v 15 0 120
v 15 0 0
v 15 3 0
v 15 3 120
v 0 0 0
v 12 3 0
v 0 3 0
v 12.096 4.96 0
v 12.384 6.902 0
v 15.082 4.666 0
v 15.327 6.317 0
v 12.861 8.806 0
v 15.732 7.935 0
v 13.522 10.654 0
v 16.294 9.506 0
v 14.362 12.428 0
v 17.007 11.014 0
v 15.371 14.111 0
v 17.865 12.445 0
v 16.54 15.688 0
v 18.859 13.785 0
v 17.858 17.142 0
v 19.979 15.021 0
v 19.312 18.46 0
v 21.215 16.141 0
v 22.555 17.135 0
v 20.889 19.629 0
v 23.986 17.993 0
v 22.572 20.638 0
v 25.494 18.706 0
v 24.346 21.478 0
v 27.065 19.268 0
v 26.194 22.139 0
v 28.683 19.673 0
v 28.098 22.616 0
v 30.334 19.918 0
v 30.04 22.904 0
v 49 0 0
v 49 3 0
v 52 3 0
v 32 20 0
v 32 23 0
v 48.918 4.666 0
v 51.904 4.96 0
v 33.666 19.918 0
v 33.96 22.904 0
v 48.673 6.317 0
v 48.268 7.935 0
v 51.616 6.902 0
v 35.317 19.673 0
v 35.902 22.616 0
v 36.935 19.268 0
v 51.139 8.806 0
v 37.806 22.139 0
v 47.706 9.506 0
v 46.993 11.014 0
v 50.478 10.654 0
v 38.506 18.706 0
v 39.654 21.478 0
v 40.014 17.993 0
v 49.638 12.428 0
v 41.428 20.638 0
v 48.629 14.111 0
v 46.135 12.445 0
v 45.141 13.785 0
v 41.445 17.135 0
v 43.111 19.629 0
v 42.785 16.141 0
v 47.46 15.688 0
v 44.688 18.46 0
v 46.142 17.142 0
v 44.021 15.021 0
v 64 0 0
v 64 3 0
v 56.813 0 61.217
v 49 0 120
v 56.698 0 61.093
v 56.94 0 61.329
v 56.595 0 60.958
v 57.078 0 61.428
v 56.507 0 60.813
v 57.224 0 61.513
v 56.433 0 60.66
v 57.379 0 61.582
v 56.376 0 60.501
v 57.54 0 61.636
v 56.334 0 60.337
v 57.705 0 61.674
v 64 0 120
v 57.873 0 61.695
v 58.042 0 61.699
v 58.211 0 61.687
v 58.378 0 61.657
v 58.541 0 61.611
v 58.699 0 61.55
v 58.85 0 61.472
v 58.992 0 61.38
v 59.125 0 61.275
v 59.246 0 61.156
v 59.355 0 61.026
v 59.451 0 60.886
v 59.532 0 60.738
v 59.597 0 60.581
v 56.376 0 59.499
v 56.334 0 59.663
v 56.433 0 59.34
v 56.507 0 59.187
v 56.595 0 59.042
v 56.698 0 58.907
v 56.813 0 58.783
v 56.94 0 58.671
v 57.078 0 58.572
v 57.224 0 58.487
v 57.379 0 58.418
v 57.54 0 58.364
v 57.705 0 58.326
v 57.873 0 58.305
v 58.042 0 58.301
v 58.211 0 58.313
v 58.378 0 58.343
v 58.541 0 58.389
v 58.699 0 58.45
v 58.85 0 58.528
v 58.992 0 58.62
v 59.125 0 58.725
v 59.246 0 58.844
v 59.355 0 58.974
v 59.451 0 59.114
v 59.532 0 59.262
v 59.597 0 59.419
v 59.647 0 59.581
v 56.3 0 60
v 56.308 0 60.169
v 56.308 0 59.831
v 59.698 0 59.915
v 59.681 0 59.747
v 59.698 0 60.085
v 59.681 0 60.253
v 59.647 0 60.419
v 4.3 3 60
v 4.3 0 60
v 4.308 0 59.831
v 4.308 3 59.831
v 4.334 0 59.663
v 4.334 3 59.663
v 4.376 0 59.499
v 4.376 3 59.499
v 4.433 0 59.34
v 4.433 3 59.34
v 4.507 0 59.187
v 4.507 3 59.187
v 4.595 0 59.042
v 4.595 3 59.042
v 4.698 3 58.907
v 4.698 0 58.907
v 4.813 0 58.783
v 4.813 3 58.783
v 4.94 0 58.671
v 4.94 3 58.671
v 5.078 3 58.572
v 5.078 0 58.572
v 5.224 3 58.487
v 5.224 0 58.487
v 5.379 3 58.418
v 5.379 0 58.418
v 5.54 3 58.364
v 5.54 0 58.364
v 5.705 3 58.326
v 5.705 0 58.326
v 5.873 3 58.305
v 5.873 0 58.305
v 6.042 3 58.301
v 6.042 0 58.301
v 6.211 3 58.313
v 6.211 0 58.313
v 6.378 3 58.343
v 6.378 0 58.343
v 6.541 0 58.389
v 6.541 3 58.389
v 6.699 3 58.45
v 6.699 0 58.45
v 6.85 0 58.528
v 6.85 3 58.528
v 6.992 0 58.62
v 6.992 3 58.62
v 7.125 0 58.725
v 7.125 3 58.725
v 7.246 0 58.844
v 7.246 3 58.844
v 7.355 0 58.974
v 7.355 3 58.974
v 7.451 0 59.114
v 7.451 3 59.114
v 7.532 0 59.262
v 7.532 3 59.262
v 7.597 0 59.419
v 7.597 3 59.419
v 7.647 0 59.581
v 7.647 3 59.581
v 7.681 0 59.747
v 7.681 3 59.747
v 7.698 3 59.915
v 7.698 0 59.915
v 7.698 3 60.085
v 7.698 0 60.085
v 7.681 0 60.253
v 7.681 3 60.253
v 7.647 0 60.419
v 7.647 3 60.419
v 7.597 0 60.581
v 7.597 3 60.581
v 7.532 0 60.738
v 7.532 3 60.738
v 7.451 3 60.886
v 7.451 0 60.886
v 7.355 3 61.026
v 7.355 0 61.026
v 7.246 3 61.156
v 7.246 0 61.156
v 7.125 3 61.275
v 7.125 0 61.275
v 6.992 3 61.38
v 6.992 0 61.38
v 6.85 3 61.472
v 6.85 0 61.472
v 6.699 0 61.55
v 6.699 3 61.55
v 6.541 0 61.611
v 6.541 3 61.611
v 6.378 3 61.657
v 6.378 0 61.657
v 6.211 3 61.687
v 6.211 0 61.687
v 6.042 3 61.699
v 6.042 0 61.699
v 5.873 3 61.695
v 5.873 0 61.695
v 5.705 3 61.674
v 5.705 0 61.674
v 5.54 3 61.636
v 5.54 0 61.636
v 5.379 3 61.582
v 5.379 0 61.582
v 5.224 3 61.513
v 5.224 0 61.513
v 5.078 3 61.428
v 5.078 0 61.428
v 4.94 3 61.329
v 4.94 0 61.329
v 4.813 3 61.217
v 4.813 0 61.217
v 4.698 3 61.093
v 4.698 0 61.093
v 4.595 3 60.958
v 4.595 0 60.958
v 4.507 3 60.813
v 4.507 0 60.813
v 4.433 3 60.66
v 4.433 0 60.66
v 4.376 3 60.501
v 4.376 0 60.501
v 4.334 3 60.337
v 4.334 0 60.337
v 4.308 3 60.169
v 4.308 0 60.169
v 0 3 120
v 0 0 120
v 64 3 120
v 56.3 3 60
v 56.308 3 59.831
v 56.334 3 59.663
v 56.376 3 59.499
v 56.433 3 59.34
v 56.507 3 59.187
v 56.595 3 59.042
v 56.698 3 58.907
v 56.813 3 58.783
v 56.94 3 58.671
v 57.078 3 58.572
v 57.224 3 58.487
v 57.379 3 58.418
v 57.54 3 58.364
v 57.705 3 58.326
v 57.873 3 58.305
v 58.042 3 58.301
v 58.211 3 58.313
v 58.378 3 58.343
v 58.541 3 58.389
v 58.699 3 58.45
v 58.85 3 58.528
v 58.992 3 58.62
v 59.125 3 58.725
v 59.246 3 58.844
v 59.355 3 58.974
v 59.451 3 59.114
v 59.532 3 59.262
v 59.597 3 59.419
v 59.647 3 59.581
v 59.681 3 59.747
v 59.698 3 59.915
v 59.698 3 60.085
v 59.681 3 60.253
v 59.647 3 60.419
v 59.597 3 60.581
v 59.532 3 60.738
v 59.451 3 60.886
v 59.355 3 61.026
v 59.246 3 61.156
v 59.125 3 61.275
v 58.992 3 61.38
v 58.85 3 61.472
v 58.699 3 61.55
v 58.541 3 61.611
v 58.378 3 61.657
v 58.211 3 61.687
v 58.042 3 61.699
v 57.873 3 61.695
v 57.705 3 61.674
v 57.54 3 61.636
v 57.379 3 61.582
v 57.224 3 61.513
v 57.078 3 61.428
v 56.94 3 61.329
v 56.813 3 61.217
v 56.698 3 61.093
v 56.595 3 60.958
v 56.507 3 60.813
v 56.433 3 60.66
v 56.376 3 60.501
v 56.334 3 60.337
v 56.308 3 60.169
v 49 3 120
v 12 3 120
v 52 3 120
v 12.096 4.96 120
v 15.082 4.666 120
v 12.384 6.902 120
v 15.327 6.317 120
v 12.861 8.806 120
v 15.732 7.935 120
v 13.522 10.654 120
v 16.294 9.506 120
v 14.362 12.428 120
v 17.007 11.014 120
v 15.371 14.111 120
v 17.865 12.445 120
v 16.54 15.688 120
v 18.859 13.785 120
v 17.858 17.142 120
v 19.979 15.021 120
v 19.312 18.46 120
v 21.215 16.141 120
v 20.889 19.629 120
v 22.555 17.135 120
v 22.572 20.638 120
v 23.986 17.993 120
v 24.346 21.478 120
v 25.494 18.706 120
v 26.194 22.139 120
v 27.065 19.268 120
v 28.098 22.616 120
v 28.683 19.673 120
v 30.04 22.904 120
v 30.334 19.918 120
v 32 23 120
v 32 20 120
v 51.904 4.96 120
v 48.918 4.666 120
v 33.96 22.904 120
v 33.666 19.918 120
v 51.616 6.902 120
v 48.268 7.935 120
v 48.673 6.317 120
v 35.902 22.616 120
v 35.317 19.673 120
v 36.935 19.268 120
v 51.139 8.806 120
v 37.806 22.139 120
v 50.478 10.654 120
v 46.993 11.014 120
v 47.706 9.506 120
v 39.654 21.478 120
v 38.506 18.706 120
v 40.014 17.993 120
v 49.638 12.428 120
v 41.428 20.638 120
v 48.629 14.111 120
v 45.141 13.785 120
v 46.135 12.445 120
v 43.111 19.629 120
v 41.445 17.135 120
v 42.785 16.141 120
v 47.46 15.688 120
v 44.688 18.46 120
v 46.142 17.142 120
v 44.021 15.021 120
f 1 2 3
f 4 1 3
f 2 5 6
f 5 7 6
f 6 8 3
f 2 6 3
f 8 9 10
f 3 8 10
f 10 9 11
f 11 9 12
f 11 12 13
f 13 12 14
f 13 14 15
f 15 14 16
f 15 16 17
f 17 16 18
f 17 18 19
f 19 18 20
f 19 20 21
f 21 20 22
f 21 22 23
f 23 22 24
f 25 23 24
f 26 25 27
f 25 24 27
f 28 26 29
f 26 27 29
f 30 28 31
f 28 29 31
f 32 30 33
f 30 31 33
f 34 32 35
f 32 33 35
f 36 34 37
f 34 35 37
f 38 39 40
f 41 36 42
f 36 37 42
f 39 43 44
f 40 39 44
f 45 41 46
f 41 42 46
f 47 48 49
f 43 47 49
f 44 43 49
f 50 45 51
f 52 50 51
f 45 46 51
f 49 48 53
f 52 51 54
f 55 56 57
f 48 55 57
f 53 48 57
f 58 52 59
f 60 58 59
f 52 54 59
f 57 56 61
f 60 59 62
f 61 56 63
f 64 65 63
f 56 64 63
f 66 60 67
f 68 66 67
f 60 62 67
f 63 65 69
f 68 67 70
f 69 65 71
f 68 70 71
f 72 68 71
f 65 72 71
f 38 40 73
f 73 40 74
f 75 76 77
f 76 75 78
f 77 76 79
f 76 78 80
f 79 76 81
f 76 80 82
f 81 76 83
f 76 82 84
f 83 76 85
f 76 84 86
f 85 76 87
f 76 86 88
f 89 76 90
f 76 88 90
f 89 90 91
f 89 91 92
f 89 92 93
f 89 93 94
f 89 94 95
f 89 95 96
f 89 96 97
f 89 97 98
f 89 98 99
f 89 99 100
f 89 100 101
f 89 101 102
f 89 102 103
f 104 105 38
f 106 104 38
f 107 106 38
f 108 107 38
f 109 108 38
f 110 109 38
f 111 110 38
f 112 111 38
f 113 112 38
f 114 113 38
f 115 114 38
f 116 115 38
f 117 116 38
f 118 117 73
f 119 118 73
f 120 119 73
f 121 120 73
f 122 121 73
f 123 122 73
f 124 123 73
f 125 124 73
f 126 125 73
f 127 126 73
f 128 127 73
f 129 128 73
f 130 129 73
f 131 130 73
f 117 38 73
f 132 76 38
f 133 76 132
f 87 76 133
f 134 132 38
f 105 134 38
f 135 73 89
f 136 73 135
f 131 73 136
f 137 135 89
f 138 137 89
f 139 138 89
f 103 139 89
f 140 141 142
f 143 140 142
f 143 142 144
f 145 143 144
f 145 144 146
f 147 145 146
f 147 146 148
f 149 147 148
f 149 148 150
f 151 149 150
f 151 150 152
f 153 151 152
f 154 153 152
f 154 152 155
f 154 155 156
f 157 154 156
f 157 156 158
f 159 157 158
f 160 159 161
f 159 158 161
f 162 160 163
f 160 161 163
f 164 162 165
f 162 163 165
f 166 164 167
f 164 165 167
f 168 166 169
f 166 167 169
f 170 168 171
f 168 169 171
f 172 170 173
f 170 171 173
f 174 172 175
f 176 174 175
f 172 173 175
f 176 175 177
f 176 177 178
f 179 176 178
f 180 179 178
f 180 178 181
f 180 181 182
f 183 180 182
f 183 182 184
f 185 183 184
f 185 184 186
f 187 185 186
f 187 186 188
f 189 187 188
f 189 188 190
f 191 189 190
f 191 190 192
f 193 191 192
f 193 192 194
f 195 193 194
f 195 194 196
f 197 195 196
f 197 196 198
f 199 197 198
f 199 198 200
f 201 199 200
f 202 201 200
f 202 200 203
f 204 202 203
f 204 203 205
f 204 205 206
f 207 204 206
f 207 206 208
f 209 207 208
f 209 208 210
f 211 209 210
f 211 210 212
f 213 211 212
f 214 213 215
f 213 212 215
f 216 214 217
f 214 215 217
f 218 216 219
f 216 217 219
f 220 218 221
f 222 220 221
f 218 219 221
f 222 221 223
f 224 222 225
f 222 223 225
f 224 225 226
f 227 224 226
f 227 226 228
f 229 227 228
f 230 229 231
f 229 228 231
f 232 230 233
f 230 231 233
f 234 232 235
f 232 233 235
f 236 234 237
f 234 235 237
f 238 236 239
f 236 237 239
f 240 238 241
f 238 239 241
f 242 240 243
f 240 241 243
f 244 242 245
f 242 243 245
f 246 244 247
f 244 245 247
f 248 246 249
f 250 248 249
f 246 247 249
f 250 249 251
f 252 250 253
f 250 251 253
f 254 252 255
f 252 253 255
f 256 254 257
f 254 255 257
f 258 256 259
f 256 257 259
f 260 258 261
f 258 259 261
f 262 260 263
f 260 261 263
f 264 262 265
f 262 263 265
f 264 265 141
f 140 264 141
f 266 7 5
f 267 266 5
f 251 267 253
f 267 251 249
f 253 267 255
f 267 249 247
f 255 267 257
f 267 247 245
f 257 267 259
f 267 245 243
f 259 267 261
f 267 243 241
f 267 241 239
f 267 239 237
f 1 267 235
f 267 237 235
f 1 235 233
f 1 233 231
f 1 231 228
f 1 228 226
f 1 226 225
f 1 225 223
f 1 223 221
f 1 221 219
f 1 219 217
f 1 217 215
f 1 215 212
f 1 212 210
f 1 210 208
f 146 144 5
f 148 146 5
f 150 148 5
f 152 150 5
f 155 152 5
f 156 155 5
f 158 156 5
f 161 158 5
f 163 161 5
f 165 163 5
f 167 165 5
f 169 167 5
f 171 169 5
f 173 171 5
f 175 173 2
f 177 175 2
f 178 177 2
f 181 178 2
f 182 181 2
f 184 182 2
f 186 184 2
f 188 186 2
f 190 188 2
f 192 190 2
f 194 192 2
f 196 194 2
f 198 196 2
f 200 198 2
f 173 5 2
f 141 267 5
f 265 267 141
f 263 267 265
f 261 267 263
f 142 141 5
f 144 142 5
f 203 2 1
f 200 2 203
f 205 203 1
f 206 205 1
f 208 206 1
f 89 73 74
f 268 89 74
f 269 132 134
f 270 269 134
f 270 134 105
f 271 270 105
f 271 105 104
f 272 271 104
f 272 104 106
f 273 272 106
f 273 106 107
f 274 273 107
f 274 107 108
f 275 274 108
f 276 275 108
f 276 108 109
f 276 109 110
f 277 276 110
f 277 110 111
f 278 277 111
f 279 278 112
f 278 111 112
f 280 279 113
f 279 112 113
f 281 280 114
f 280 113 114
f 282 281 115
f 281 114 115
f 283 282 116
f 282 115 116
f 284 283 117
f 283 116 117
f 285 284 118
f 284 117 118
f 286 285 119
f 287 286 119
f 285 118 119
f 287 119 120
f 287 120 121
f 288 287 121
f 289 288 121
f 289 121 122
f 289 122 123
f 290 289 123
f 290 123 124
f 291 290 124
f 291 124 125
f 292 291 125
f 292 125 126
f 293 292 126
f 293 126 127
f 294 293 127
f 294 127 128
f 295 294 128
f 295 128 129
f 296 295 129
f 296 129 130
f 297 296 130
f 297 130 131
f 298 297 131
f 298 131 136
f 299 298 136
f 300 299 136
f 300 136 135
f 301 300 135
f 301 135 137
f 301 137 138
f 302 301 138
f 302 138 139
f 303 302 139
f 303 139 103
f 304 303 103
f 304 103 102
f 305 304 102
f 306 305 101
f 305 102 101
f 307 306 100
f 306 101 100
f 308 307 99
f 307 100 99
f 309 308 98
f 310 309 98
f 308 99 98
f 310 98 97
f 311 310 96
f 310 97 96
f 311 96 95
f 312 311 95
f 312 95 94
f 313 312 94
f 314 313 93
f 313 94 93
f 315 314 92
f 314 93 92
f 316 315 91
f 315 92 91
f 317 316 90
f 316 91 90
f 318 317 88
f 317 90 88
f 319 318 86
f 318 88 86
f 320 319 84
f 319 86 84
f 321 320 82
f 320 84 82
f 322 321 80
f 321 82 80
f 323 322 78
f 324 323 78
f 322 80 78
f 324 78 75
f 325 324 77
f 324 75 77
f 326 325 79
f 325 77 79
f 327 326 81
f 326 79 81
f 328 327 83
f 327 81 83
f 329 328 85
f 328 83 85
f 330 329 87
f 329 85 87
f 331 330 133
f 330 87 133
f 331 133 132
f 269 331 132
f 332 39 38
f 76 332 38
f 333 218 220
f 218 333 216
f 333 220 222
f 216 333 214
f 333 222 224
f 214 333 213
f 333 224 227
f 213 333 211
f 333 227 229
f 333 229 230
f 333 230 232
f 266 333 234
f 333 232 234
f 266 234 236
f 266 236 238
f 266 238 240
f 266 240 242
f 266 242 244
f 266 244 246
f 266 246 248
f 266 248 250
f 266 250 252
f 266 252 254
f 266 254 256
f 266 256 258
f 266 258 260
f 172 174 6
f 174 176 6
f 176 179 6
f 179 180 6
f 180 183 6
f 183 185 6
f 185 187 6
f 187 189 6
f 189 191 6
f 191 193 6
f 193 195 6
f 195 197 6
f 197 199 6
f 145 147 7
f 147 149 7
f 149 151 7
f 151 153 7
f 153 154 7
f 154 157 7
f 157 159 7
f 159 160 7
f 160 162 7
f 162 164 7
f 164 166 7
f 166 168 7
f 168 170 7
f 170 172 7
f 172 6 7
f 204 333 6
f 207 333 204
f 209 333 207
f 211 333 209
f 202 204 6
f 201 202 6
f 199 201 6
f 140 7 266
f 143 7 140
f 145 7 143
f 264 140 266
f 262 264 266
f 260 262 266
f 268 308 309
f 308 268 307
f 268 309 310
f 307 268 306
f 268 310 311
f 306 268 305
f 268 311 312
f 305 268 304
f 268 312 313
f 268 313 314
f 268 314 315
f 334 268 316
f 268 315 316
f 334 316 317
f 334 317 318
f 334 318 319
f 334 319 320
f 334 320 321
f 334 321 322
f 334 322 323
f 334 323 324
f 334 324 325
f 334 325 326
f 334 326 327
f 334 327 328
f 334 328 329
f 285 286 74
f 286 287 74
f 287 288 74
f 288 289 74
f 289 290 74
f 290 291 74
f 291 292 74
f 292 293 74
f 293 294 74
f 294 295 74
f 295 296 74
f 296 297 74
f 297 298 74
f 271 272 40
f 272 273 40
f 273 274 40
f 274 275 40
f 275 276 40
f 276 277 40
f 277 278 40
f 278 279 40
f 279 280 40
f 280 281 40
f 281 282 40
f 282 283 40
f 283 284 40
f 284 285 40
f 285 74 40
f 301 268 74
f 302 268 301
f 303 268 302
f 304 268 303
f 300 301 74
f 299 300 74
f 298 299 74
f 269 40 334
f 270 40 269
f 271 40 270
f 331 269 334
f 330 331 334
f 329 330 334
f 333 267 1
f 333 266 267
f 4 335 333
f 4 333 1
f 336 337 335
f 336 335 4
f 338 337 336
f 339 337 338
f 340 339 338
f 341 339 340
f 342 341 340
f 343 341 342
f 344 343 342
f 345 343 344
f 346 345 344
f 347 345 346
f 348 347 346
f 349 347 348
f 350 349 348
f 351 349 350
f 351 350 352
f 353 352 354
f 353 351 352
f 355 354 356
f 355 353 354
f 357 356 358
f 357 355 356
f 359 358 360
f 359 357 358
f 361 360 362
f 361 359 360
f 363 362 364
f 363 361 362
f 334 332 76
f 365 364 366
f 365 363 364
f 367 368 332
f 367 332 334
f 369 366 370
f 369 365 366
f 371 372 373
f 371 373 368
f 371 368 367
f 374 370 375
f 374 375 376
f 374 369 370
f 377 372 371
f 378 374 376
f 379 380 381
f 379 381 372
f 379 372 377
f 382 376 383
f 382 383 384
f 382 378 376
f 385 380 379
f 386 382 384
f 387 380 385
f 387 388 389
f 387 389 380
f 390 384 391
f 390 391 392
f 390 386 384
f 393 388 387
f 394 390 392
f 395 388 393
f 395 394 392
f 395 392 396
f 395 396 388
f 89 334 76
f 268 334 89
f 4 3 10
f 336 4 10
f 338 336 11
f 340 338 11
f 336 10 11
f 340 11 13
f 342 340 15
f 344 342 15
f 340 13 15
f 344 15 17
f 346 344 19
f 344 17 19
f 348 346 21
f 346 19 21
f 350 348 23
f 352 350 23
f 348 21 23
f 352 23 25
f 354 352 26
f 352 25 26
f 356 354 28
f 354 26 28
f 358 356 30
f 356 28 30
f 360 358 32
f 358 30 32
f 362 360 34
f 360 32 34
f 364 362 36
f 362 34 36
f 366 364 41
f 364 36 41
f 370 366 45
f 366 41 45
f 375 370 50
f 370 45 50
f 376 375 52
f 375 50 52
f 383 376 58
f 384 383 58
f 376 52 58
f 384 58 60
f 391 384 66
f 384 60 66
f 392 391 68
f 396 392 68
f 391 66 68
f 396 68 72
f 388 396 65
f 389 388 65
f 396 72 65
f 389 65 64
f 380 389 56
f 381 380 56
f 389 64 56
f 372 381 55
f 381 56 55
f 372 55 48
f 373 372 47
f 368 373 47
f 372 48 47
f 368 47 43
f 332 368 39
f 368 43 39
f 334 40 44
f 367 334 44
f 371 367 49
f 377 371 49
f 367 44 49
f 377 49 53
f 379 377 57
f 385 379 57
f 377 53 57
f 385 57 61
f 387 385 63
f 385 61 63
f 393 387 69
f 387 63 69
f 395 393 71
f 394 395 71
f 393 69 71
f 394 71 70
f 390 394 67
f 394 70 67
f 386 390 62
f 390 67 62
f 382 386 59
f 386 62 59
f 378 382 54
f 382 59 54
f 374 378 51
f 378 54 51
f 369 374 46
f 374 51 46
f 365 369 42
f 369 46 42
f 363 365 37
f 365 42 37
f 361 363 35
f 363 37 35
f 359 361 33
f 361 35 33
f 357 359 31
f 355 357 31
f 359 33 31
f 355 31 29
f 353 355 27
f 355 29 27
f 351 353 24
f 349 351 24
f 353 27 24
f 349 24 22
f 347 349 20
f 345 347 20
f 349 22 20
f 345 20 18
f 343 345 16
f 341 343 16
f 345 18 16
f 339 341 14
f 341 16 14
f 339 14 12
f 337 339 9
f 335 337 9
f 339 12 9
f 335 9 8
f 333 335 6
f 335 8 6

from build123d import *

# Parameters (mm, degrees)
AUFSATZ_LINEAR_AUSTRAGEN1_DEPTH      = 120
F_3_4_3_4_DURCHMESSER_BOHRUNG1_D     = 3.4
F_3_4_3_4_DURCHMESSER_BOHRUNG1_DEPTH = 5
F_3_4_3_4_DURCHMESSER_BOHRUNG1_TIP   = 1.021463052


with BuildPart() as part:
    # Skizze1 → Aufsatz-Linear austragen1 (new body)
    with BuildSketch(Plane.XY):
        with BuildLine():
            Line((0, 0), (15, 0))
            Line((15, 0), (15, 3))
            ThreePointArc((15, 3), (32, 20), (49, 3))
            Line((49, 3), (49, 0))
            Line((49, 0), (64, 0))
            Line((64, 0), (64, 3))
            Line((64, 3), (52, 3))
            ThreePointArc((52, 3), (32, 23), (12, 3))
            Line((12, 3), (0, 3))
            Line((0, 3), (0, 0))
        make_face()
    extrude(amount=AUFSATZ_LINEAR_AUSTRAGEN1_DEPTH)

    # Ø3.4 (3.4) Durchmesser Bohrung1
    with Locations(Plane(origin=(0, 3, 0), x_dir=(1, 0, 0), z_dir=(0, 1, 0))):
        with Locations((58, -60), (6, -60)):
            Hole(F_3_4_3_4_DURCHMESSER_BOHRUNG1_D / 2, depth=F_3_4_3_4_DURCHMESSER_BOHRUNG1_DEPTH)
            with Locations((0, 0, -(F_3_4_3_4_DURCHMESSER_BOHRUNG1_DEPTH + F_3_4_3_4_DURCHMESSER_BOHRUNG1_TIP / 2))):  # 118° drill point
                Cone(0, F_3_4_3_4_DURCHMESSER_BOHRUNG1_D / 2, F_3_4_3_4_DURCHMESSER_BOHRUNG1_TIP, mode=Mode.SUBTRACT)


solid = part.part
